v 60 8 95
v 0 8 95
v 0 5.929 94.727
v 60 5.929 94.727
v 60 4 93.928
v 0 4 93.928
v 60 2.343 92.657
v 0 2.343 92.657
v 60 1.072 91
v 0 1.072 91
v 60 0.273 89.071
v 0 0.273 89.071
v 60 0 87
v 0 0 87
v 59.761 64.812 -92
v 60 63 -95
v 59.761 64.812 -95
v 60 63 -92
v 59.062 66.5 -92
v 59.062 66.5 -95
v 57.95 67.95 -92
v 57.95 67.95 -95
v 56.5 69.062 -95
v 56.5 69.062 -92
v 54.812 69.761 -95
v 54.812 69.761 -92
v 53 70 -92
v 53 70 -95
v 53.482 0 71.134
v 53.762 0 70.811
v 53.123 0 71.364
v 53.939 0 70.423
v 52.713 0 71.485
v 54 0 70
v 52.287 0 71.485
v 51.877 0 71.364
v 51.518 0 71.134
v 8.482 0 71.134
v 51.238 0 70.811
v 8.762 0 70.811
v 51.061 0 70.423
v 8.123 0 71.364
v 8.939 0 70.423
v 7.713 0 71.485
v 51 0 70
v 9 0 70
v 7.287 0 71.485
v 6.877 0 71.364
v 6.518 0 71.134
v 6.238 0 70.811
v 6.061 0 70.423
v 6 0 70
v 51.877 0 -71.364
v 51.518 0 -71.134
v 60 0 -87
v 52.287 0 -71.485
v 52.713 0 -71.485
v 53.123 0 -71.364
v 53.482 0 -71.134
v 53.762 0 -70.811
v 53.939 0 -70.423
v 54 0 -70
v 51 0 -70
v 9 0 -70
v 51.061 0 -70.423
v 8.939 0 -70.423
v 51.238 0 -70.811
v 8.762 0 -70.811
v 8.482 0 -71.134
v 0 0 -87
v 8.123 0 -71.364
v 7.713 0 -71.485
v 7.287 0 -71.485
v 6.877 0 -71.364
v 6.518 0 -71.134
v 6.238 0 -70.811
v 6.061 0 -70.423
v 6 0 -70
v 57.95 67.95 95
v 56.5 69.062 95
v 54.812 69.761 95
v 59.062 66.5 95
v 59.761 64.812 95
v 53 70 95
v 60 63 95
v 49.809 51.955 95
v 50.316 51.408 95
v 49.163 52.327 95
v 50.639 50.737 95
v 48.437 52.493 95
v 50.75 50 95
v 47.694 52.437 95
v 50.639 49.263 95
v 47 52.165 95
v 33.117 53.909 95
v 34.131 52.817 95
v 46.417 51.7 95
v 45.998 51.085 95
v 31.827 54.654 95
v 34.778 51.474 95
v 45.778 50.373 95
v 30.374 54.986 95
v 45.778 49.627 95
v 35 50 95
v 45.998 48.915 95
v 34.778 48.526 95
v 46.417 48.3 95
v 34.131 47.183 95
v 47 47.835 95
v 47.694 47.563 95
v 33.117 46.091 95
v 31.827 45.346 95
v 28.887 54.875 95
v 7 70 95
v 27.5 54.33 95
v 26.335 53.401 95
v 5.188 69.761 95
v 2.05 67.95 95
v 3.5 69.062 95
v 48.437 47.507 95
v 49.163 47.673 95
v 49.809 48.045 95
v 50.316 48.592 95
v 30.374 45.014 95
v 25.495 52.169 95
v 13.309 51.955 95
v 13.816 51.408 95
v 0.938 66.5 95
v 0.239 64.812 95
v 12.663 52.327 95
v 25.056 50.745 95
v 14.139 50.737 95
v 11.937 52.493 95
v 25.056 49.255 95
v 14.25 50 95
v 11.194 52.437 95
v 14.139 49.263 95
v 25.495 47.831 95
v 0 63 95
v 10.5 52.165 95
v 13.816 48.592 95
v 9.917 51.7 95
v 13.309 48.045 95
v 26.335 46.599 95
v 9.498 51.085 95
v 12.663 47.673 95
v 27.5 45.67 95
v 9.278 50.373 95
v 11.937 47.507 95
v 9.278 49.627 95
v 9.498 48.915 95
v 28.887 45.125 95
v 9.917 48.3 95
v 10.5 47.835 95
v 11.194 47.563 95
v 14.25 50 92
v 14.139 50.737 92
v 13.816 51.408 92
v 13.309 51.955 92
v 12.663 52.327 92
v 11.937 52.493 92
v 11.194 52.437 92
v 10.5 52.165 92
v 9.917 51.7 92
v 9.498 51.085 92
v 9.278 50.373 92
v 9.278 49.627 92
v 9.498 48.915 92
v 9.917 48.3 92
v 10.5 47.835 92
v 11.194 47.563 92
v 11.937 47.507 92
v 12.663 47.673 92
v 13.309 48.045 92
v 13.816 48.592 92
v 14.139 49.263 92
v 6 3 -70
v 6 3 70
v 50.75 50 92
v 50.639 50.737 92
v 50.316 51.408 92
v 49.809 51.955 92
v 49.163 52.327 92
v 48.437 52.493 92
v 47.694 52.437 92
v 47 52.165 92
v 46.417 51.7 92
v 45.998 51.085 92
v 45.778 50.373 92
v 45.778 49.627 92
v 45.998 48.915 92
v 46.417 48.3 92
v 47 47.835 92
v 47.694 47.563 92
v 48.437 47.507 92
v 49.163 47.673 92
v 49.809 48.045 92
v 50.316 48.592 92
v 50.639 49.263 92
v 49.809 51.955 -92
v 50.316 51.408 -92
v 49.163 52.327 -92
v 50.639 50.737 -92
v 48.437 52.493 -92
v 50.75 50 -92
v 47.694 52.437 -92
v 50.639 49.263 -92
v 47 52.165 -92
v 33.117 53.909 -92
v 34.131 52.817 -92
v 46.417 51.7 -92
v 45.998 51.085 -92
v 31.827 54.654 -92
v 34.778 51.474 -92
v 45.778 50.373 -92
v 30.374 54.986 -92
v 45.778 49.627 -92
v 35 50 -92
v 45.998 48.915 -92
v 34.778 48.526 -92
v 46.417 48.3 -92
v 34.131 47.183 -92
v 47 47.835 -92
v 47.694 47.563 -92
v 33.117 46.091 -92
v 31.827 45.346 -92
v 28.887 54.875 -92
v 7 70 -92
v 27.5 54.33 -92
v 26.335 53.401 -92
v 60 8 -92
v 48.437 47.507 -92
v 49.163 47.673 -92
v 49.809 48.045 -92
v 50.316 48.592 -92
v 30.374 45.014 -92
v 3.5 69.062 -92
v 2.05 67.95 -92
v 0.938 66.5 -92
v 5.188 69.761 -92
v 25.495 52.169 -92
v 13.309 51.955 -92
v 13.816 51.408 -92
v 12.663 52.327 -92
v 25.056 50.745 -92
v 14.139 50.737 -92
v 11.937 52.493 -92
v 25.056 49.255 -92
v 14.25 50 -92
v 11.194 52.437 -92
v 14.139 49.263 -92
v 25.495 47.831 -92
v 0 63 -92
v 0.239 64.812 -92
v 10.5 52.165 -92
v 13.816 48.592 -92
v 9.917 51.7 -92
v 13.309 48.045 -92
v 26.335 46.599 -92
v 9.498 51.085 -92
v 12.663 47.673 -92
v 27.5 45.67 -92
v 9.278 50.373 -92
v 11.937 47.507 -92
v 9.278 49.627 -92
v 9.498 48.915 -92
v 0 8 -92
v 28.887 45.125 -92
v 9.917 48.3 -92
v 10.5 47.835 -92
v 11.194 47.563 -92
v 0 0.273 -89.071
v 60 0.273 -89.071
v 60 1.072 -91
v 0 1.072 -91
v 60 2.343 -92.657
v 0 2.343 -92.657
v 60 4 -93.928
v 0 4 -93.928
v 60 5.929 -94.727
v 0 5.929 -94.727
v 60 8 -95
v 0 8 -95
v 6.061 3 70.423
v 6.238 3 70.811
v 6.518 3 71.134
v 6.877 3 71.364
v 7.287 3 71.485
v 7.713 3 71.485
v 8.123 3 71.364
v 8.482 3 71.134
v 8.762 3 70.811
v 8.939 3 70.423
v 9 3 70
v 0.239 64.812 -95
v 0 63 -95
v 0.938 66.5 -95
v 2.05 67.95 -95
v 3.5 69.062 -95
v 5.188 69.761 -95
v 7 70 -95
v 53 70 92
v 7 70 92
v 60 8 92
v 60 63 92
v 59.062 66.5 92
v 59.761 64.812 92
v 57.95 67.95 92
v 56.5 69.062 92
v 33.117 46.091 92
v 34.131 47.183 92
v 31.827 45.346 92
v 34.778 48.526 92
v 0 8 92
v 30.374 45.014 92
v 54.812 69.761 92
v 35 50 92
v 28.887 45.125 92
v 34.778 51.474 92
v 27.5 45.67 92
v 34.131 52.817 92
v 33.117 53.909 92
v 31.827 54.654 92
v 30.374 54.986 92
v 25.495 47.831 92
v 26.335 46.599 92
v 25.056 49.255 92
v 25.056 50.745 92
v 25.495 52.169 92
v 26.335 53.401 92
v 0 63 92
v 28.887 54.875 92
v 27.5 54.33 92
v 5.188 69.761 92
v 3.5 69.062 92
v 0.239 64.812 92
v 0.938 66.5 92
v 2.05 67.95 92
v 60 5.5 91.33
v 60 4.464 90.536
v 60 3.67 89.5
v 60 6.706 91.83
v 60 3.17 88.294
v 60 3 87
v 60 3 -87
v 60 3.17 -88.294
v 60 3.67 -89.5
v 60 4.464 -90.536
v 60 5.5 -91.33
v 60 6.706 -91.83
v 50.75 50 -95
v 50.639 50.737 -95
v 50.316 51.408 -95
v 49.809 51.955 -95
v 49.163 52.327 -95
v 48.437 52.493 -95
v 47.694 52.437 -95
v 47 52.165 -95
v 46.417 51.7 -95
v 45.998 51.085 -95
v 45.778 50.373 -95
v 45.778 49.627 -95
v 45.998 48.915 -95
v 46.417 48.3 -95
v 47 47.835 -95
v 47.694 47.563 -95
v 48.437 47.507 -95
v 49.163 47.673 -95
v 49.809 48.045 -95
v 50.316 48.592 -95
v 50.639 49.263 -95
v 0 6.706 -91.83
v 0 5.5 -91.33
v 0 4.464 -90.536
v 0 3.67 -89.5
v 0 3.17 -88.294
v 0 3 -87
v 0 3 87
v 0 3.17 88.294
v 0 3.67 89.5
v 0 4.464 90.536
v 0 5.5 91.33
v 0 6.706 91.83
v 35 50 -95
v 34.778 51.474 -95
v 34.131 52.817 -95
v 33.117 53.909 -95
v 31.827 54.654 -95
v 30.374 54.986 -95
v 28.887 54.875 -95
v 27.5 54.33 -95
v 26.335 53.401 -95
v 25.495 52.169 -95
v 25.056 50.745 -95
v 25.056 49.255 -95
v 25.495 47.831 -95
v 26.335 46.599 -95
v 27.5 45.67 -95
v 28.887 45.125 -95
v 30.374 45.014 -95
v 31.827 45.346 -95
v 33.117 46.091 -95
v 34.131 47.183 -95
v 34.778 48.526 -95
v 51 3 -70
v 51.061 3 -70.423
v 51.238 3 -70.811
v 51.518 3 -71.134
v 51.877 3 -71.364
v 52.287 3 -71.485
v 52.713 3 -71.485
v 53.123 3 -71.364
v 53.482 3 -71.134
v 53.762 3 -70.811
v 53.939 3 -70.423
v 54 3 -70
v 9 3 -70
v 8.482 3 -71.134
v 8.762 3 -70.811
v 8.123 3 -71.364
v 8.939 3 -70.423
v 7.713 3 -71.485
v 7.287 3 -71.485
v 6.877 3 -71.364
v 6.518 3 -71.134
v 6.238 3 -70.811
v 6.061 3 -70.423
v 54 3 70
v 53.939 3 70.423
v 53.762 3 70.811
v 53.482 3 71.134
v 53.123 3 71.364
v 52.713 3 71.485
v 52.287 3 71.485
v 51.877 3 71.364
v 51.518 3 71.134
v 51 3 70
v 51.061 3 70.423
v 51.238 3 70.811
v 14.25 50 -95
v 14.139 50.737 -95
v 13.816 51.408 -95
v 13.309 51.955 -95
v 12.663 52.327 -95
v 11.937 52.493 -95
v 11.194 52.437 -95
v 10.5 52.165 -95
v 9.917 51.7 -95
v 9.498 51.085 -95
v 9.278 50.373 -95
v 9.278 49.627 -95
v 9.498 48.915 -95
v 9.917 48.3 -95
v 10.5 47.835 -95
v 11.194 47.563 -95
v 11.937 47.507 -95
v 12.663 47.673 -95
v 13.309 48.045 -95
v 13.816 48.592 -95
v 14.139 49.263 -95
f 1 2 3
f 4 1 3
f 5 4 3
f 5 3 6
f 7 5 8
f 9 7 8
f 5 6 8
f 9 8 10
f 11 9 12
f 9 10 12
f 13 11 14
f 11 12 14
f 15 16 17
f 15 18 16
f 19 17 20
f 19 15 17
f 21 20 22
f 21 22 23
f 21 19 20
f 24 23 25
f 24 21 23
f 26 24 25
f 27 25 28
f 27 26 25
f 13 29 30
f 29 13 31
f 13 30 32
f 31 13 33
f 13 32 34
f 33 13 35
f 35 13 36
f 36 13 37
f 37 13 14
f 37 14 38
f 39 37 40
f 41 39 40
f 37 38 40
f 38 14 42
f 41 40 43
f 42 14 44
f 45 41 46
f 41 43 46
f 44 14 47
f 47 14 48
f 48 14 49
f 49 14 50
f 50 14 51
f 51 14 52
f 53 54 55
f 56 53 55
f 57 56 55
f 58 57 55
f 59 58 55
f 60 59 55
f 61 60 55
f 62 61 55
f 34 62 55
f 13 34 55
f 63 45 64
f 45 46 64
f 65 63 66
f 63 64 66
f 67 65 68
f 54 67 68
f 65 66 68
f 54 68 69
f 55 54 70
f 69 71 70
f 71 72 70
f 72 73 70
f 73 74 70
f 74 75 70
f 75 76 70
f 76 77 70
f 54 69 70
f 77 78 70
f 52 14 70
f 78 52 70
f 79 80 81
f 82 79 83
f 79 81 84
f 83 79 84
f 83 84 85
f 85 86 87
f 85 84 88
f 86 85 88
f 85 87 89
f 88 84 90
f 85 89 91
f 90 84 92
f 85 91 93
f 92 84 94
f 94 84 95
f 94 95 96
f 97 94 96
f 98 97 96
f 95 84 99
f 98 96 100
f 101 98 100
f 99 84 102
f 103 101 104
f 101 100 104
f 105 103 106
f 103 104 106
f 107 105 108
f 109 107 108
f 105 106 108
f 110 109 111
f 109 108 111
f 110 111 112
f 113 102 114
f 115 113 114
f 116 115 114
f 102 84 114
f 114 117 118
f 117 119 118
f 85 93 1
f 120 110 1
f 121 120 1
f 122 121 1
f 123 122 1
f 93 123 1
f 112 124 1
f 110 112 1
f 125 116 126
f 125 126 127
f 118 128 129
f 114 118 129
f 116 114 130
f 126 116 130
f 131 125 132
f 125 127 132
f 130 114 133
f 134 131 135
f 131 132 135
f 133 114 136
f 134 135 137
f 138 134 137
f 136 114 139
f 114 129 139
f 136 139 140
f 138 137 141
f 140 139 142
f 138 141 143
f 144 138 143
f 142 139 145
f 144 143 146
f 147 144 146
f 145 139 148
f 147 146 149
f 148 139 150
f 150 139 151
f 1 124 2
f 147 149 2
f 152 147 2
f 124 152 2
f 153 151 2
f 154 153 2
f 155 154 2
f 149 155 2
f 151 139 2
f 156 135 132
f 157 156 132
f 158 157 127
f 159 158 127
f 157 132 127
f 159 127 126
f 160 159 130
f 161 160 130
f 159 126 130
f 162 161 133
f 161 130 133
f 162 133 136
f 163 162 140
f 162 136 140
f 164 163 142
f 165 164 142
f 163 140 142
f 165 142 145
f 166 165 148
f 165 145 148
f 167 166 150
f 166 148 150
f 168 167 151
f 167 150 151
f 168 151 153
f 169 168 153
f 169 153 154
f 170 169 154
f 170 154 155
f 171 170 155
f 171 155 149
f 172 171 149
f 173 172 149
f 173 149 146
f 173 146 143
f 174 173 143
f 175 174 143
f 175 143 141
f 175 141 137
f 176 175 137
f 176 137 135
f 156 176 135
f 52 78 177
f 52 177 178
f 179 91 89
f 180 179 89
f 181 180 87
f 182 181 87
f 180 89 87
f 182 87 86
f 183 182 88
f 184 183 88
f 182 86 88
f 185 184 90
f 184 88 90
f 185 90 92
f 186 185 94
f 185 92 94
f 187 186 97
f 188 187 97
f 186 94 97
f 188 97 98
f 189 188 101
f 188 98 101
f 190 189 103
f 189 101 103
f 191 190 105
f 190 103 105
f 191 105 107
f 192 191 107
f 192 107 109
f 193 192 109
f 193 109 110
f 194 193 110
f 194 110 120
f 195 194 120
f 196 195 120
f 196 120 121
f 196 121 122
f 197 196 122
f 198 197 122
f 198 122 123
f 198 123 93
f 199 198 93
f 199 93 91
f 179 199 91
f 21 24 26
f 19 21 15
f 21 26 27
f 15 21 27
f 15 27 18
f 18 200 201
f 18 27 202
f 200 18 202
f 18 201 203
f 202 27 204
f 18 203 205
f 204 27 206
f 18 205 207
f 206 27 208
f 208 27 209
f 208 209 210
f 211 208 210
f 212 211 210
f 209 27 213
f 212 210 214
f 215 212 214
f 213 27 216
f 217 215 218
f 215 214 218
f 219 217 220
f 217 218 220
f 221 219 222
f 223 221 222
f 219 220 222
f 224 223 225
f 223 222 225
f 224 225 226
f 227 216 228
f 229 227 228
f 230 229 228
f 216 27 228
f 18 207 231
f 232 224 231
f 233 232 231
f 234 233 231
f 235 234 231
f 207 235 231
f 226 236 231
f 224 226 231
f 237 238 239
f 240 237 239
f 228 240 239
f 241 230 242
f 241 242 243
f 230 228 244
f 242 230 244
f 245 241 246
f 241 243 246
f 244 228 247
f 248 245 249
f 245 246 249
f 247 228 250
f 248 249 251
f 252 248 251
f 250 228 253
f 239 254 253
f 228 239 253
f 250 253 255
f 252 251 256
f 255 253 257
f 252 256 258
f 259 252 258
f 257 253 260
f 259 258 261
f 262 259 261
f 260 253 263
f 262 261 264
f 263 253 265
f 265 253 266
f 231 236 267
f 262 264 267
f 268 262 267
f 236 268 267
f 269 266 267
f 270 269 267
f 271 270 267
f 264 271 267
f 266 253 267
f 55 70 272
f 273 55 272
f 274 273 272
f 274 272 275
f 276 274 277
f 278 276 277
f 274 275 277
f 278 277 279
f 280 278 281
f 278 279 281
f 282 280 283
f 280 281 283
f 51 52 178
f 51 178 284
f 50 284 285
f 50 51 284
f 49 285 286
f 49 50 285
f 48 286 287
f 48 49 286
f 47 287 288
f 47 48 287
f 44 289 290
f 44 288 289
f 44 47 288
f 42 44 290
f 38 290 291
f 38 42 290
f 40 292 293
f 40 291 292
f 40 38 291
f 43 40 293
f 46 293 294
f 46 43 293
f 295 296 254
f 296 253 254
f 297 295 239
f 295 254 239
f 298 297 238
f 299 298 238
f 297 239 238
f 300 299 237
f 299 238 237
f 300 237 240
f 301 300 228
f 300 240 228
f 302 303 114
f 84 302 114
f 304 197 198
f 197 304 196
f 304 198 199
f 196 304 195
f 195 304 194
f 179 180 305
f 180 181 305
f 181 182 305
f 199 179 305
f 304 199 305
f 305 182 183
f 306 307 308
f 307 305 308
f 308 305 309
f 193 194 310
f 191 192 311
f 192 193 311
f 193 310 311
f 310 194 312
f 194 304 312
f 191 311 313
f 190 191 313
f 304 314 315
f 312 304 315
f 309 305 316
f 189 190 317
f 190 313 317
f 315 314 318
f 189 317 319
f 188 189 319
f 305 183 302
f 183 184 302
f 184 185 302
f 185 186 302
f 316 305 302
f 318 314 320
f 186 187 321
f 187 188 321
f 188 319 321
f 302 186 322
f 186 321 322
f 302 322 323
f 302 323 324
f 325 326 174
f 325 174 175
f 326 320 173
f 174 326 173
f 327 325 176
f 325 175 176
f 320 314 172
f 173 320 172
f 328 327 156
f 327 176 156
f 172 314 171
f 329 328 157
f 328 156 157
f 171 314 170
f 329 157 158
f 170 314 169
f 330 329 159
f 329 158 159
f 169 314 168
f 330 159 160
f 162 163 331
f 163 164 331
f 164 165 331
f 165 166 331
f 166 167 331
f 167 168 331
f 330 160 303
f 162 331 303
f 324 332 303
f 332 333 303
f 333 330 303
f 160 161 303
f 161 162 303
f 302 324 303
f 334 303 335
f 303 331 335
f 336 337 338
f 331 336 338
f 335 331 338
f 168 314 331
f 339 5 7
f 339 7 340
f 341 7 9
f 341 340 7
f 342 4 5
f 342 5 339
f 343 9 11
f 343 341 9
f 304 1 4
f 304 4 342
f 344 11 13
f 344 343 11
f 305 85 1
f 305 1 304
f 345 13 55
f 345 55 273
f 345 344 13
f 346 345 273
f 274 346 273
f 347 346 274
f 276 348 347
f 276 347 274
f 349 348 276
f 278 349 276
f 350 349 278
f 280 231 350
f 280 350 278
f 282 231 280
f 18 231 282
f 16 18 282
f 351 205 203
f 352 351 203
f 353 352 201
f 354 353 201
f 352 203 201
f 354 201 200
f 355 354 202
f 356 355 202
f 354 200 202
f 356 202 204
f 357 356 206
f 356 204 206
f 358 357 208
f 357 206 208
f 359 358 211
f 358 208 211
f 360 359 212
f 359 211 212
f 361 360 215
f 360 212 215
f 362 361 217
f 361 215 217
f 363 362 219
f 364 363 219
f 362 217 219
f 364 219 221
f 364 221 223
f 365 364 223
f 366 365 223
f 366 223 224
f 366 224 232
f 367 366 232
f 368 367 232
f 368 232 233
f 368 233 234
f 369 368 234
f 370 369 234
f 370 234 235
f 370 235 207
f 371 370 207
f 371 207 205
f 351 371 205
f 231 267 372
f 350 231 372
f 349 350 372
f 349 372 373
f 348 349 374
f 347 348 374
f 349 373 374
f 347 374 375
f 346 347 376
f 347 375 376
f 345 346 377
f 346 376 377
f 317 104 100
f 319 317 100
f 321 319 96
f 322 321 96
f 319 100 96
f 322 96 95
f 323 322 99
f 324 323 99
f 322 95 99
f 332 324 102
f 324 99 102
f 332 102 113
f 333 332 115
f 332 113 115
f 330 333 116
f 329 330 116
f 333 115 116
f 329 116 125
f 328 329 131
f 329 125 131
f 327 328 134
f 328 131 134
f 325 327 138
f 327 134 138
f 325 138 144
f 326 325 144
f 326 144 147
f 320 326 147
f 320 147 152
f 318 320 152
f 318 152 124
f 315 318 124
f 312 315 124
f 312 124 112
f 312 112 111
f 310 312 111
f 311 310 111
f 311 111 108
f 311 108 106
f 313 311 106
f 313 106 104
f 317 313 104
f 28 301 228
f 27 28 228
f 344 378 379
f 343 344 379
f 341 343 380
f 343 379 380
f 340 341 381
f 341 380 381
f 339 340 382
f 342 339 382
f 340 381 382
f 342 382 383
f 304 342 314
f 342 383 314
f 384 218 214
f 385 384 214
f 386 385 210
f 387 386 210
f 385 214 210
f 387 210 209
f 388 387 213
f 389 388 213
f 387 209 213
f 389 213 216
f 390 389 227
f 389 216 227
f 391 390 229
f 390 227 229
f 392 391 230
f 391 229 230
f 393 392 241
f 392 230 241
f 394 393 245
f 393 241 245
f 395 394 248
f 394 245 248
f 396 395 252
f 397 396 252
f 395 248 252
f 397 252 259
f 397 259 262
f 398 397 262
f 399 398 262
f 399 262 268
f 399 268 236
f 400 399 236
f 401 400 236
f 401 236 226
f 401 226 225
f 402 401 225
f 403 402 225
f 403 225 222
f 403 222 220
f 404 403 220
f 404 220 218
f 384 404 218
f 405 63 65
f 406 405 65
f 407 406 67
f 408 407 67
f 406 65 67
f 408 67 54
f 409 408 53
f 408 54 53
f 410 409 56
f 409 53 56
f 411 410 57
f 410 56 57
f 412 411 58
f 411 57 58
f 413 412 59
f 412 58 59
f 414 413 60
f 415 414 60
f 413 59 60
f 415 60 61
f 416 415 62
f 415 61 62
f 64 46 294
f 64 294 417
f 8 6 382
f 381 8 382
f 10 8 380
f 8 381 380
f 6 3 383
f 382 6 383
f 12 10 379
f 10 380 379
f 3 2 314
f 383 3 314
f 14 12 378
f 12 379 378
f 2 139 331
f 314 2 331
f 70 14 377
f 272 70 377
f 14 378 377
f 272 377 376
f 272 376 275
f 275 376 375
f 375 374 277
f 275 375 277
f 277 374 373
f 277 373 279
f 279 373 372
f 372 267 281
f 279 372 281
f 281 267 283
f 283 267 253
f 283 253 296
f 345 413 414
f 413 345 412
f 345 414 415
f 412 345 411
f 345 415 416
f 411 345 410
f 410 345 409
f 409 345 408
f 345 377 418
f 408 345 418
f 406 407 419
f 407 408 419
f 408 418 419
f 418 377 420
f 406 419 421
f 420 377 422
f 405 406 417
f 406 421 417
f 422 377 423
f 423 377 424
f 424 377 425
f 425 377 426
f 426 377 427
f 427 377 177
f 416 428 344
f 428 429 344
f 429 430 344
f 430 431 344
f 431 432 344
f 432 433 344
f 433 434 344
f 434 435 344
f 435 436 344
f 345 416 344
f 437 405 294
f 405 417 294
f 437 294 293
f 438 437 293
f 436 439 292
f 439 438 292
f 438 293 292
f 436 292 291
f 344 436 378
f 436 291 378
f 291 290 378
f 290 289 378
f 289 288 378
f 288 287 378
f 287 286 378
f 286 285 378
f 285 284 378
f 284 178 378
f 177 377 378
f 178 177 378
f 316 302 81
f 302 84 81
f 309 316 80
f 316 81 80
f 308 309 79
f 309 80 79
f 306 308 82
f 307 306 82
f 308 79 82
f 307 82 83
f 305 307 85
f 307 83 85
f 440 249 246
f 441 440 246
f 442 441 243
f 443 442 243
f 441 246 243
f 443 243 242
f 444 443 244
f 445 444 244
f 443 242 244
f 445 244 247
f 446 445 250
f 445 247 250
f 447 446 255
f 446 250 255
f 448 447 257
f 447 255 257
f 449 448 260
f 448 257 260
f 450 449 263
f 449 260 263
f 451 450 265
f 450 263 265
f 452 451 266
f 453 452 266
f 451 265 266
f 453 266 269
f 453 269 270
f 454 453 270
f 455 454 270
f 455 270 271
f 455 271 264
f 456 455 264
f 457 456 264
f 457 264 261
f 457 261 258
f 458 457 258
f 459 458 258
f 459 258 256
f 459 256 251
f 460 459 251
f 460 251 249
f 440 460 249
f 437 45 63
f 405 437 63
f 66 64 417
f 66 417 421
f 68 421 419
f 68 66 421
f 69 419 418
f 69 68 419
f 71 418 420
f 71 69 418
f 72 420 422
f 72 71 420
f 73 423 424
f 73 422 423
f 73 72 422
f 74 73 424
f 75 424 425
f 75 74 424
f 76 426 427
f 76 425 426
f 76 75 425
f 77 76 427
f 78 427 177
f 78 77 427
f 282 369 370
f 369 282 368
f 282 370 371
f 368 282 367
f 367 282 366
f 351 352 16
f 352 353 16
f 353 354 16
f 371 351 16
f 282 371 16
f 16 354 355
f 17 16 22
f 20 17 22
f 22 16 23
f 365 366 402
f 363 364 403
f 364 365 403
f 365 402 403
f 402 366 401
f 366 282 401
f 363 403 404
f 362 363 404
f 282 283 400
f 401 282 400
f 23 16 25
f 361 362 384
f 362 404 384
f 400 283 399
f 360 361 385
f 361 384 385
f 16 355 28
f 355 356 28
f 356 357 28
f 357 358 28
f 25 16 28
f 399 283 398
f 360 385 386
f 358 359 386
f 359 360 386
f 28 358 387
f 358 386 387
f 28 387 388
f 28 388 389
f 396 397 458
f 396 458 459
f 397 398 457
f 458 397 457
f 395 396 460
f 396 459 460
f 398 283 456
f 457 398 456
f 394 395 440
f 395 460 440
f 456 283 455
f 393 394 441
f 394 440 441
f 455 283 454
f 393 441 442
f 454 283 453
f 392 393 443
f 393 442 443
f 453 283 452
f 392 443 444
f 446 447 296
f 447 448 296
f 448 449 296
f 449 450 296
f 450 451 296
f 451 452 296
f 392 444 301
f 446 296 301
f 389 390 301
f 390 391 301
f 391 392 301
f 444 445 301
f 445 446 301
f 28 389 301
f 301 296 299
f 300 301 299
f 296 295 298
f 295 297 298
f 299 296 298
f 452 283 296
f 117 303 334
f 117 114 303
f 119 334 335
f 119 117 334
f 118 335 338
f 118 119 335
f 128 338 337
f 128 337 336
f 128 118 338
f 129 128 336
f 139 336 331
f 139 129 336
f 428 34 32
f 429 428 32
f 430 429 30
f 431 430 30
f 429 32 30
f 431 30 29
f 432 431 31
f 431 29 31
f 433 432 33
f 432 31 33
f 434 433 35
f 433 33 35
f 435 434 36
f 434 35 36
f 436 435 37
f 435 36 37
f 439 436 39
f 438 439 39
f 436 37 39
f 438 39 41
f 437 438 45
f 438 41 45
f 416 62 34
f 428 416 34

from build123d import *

# Parameters (mm, degrees)
BASE_FLANGE1_DEPTH = 60
SKETCH6_R          = 5
SKETCH6_R_2        = 2.5
CUT_EXTRUDE1_DEPTH = 212.187120819
CUT_EXTRUDE2_DEPTH = 10
FILLET1_R          = 7


# Sheet-metal steps are written as plain solids
with BuildPart() as part:
    # Sketch1 → Base-Flange1 (new body)
    with BuildSketch(Plane(origin=(0, 0, 0), x_dir=(0, 0, -1), z_dir=(1, 0, 0))):
        with BuildLine():
            Line((-95, 70), (-95, 8))
            ThreePointArc((-95, 8), (-92.656854249, 2.343145751), (-87, 0))
            Line((-87, 0), (87, 0))
            ThreePointArc((87, 0), (92.656854249, 2.343145751), (95, 8))
            Line((95, 8), (95, 70))
            Line((95, 70), (92, 70))
            Line((92, 70), (92, 8))
            ThreePointArc((92, 8), (90.535533906, 4.464466094), (87, 3))
            Line((87, 3), (-87, 3))
            ThreePointArc((-87, 3), (-90.535533906, 4.464466094), (-92, 8))
            Line((-92, 8), (-92, 70))
            Line((-92, 70), (-95, 70))
        make_face()
    extrude(amount=BASE_FLANGE1_DEPTH)

    # Sketch6 → Cut-Extrude1 (cut, through all)
    with BuildSketch(Plane.XY.offset(95)):
        with Locations((30, 50)):
            Circle(SKETCH6_R)
        with Locations((11.75, 50)):
            Circle(SKETCH6_R_2)
        with Locations((48.25, 50)):
            Circle(SKETCH6_R_2)
    extrude(amount=-CUT_EXTRUDE1_DEPTH, mode=Mode.SUBTRACT)

    # Sketch7 → Cut-Extrude2 (cut)
    with BuildSketch(Plane(origin=(0, 0, 0), x_dir=(-1, 0, 0), z_dir=(0, -1, 0))):
        with BuildLine():
            Line((-6, 70), (-6, -70))
            ThreePointArc((-6, -70), (-7.5, -71.5), (-9, -70))
            Line((-9, -70), (-9, 70))
            ThreePointArc((-9, 70), (-7.5, 71.5), (-6, 70))
        make_face()
        with BuildLine():
            Line((-54, 70), (-54, -70))
            ThreePointArc((-54, -70), (-52.5, -71.5), (-51, -70))
            Line((-51, -70), (-51, 70))
            ThreePointArc((-51, 70), (-52.5, 71.5), (-54, 70))
        make_face()
    extrude(amount=-CUT_EXTRUDE2_DEPTH, mode=Mode.SUBTRACT)

    # Fillet1
    fillet1_edges = [part.edges().sort_by_distance(p)[0] for p in [
        (0, 70, -93.5),
        (0, 70, 93.5),
        (60, 70, -93.5),
        (60, 70, 93.5),
    ]]
    fillet(fillet1_edges, radius=FILLET1_R)


solid = part.part
